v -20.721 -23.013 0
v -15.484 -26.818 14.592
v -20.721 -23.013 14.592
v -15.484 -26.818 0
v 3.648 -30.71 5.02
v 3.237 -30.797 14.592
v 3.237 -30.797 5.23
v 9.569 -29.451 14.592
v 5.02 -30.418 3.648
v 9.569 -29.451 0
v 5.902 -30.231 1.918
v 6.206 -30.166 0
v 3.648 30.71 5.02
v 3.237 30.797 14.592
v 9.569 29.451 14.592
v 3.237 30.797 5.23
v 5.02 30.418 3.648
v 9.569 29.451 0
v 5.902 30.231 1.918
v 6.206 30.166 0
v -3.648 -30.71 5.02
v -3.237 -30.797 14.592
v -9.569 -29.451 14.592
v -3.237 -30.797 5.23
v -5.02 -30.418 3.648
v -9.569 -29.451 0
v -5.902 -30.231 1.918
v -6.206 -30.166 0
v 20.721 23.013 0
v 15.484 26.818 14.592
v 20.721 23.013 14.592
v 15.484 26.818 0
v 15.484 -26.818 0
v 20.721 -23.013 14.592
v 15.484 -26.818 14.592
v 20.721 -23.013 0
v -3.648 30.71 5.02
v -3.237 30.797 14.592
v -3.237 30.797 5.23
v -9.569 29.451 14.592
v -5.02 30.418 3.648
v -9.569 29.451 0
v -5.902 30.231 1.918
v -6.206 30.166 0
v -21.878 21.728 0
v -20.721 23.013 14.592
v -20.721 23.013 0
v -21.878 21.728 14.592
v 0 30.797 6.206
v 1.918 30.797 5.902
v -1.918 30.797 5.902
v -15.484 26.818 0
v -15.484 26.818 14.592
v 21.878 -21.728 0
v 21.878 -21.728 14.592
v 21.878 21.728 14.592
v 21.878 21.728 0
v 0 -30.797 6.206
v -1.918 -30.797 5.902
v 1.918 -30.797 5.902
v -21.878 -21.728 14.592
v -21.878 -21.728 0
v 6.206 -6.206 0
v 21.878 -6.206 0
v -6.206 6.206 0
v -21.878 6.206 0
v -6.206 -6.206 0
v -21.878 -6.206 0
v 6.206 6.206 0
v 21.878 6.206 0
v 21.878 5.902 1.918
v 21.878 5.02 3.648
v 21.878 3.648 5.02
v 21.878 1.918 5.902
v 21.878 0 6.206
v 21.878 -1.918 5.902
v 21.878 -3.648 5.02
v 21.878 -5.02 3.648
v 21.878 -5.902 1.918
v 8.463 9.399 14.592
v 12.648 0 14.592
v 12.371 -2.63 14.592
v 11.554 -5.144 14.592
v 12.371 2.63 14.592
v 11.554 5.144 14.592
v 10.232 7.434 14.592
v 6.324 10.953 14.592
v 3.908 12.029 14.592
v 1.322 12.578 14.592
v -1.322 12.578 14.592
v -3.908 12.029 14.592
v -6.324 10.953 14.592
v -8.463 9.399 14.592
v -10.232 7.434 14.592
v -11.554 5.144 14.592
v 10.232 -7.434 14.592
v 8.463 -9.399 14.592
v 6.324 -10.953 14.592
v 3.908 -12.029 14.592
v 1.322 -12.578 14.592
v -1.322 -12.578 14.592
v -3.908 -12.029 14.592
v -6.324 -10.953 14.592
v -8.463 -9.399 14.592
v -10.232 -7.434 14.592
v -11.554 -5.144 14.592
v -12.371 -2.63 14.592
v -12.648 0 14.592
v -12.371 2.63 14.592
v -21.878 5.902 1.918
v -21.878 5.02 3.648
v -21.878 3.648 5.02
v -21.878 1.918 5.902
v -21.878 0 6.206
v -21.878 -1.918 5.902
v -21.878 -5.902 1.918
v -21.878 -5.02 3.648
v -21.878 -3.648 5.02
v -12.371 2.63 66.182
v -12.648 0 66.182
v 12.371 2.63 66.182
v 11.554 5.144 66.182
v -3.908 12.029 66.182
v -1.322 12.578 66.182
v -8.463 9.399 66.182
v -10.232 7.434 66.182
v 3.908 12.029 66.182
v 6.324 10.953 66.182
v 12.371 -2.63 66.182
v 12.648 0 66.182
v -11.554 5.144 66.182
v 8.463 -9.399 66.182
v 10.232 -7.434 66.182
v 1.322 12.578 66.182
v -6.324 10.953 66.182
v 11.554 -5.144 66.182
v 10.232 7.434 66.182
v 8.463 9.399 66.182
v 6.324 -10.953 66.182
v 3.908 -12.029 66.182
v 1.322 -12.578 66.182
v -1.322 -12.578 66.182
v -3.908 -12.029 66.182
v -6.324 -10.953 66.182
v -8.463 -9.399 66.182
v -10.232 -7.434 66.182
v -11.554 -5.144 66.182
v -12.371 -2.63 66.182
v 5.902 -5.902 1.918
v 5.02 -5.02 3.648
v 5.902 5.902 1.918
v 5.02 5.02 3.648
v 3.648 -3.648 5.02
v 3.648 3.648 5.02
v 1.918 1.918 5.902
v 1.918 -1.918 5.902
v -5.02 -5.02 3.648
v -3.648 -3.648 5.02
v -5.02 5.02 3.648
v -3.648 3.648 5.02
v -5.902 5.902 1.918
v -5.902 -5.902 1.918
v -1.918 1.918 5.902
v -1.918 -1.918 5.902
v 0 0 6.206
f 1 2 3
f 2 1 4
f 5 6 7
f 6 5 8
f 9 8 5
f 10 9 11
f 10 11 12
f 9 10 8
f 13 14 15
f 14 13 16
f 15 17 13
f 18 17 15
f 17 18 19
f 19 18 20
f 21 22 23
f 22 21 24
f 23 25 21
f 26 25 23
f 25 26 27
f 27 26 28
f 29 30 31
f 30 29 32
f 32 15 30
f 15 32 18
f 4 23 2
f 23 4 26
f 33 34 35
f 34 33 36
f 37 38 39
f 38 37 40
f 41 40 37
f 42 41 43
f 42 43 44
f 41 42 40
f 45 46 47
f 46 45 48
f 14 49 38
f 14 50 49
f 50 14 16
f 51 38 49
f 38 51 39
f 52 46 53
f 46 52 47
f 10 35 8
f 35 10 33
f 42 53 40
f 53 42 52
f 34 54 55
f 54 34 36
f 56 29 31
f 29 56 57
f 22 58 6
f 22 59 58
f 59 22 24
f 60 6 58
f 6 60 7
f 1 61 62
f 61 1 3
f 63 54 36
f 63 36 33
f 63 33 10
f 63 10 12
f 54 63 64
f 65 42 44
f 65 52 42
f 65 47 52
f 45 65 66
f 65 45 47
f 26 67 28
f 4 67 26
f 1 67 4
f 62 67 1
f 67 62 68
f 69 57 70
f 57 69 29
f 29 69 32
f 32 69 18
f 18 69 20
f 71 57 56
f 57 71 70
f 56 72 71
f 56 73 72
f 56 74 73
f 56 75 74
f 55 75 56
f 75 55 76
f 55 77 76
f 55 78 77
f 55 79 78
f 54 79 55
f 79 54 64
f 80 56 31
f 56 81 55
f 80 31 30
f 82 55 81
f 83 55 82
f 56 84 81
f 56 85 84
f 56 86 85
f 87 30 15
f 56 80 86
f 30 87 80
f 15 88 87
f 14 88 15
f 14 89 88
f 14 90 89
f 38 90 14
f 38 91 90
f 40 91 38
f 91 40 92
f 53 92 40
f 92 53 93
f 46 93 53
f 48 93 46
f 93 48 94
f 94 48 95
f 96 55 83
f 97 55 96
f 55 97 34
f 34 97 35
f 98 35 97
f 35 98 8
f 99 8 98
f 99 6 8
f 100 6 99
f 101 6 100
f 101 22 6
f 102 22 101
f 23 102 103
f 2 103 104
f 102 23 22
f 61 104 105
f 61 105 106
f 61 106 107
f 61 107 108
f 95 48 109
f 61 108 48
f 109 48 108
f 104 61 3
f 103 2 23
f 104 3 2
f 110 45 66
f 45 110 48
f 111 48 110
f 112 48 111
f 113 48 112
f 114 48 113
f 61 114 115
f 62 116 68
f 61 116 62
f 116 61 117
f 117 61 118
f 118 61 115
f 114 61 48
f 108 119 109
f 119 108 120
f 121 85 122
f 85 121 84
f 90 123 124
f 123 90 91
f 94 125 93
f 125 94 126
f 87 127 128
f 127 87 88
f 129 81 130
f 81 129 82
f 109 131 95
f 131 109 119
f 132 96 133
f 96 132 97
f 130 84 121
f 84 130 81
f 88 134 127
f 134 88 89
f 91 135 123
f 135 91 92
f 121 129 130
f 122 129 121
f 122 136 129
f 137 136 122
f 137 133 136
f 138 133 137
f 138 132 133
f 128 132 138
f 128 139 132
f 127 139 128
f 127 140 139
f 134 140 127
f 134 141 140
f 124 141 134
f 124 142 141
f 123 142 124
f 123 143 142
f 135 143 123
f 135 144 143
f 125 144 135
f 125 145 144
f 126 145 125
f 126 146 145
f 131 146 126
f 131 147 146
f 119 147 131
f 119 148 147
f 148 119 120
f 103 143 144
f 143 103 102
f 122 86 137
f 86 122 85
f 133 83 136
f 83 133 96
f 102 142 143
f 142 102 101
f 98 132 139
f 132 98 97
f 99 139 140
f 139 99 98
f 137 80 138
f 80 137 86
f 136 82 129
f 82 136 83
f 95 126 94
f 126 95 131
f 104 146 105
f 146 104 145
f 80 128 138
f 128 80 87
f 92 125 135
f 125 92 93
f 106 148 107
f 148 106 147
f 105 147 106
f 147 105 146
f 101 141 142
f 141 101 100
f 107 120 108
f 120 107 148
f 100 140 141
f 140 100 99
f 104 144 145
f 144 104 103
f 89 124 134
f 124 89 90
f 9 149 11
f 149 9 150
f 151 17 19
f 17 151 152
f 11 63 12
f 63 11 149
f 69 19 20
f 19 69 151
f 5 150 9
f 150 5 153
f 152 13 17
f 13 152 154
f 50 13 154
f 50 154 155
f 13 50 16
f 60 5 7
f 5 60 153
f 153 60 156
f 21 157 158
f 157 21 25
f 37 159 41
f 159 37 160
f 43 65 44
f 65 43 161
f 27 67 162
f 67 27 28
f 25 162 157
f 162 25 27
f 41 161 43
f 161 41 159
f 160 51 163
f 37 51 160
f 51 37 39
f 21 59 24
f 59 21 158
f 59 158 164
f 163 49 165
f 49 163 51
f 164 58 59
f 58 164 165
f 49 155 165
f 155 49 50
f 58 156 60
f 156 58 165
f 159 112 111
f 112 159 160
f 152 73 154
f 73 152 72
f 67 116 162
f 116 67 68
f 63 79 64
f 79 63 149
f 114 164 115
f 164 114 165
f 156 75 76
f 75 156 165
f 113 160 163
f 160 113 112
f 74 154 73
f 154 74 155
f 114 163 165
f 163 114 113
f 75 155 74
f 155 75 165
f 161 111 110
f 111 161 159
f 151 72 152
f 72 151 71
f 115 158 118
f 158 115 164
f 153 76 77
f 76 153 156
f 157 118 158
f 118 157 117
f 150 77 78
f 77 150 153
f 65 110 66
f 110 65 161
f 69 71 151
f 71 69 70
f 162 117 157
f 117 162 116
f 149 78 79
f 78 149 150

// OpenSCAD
seed = 19;
seeds = rands(0,1000000,10,seed);
head_size = rands(25,50,1,seeds[1])[0];
head_radius = rands(25,50,1,seeds[2])[0];
bolt_length = rands(head_size*2,200,1,seeds[3])[0];
bolt_radius = rands(head_size/3, head_size/2,1,seeds[0])[0];
cube_size = rands(bolt_radius*2, head_radius*1.6,1, seeds[4])[0];
hole_size = rands(cube_size/10, cube_size/7,1,seeds[5])[0];

difference(){
    union(){
        intersection(){
            cylinder(head_size,head_radius,head_radius);
            cube([cube_size,head_radius*2,head_size], center=true);
        }
        cylinder(bolt_length,bolt_radius,bolt_radius);
    }
    rotate([90, 0, 0]){
        cylinder(head_radius*2,hole_size,hole_size, true);
    }
    rotate([0, 90, 0]){
        cylinder(head_radius*2,hole_size,hole_size, true);
    }
}
